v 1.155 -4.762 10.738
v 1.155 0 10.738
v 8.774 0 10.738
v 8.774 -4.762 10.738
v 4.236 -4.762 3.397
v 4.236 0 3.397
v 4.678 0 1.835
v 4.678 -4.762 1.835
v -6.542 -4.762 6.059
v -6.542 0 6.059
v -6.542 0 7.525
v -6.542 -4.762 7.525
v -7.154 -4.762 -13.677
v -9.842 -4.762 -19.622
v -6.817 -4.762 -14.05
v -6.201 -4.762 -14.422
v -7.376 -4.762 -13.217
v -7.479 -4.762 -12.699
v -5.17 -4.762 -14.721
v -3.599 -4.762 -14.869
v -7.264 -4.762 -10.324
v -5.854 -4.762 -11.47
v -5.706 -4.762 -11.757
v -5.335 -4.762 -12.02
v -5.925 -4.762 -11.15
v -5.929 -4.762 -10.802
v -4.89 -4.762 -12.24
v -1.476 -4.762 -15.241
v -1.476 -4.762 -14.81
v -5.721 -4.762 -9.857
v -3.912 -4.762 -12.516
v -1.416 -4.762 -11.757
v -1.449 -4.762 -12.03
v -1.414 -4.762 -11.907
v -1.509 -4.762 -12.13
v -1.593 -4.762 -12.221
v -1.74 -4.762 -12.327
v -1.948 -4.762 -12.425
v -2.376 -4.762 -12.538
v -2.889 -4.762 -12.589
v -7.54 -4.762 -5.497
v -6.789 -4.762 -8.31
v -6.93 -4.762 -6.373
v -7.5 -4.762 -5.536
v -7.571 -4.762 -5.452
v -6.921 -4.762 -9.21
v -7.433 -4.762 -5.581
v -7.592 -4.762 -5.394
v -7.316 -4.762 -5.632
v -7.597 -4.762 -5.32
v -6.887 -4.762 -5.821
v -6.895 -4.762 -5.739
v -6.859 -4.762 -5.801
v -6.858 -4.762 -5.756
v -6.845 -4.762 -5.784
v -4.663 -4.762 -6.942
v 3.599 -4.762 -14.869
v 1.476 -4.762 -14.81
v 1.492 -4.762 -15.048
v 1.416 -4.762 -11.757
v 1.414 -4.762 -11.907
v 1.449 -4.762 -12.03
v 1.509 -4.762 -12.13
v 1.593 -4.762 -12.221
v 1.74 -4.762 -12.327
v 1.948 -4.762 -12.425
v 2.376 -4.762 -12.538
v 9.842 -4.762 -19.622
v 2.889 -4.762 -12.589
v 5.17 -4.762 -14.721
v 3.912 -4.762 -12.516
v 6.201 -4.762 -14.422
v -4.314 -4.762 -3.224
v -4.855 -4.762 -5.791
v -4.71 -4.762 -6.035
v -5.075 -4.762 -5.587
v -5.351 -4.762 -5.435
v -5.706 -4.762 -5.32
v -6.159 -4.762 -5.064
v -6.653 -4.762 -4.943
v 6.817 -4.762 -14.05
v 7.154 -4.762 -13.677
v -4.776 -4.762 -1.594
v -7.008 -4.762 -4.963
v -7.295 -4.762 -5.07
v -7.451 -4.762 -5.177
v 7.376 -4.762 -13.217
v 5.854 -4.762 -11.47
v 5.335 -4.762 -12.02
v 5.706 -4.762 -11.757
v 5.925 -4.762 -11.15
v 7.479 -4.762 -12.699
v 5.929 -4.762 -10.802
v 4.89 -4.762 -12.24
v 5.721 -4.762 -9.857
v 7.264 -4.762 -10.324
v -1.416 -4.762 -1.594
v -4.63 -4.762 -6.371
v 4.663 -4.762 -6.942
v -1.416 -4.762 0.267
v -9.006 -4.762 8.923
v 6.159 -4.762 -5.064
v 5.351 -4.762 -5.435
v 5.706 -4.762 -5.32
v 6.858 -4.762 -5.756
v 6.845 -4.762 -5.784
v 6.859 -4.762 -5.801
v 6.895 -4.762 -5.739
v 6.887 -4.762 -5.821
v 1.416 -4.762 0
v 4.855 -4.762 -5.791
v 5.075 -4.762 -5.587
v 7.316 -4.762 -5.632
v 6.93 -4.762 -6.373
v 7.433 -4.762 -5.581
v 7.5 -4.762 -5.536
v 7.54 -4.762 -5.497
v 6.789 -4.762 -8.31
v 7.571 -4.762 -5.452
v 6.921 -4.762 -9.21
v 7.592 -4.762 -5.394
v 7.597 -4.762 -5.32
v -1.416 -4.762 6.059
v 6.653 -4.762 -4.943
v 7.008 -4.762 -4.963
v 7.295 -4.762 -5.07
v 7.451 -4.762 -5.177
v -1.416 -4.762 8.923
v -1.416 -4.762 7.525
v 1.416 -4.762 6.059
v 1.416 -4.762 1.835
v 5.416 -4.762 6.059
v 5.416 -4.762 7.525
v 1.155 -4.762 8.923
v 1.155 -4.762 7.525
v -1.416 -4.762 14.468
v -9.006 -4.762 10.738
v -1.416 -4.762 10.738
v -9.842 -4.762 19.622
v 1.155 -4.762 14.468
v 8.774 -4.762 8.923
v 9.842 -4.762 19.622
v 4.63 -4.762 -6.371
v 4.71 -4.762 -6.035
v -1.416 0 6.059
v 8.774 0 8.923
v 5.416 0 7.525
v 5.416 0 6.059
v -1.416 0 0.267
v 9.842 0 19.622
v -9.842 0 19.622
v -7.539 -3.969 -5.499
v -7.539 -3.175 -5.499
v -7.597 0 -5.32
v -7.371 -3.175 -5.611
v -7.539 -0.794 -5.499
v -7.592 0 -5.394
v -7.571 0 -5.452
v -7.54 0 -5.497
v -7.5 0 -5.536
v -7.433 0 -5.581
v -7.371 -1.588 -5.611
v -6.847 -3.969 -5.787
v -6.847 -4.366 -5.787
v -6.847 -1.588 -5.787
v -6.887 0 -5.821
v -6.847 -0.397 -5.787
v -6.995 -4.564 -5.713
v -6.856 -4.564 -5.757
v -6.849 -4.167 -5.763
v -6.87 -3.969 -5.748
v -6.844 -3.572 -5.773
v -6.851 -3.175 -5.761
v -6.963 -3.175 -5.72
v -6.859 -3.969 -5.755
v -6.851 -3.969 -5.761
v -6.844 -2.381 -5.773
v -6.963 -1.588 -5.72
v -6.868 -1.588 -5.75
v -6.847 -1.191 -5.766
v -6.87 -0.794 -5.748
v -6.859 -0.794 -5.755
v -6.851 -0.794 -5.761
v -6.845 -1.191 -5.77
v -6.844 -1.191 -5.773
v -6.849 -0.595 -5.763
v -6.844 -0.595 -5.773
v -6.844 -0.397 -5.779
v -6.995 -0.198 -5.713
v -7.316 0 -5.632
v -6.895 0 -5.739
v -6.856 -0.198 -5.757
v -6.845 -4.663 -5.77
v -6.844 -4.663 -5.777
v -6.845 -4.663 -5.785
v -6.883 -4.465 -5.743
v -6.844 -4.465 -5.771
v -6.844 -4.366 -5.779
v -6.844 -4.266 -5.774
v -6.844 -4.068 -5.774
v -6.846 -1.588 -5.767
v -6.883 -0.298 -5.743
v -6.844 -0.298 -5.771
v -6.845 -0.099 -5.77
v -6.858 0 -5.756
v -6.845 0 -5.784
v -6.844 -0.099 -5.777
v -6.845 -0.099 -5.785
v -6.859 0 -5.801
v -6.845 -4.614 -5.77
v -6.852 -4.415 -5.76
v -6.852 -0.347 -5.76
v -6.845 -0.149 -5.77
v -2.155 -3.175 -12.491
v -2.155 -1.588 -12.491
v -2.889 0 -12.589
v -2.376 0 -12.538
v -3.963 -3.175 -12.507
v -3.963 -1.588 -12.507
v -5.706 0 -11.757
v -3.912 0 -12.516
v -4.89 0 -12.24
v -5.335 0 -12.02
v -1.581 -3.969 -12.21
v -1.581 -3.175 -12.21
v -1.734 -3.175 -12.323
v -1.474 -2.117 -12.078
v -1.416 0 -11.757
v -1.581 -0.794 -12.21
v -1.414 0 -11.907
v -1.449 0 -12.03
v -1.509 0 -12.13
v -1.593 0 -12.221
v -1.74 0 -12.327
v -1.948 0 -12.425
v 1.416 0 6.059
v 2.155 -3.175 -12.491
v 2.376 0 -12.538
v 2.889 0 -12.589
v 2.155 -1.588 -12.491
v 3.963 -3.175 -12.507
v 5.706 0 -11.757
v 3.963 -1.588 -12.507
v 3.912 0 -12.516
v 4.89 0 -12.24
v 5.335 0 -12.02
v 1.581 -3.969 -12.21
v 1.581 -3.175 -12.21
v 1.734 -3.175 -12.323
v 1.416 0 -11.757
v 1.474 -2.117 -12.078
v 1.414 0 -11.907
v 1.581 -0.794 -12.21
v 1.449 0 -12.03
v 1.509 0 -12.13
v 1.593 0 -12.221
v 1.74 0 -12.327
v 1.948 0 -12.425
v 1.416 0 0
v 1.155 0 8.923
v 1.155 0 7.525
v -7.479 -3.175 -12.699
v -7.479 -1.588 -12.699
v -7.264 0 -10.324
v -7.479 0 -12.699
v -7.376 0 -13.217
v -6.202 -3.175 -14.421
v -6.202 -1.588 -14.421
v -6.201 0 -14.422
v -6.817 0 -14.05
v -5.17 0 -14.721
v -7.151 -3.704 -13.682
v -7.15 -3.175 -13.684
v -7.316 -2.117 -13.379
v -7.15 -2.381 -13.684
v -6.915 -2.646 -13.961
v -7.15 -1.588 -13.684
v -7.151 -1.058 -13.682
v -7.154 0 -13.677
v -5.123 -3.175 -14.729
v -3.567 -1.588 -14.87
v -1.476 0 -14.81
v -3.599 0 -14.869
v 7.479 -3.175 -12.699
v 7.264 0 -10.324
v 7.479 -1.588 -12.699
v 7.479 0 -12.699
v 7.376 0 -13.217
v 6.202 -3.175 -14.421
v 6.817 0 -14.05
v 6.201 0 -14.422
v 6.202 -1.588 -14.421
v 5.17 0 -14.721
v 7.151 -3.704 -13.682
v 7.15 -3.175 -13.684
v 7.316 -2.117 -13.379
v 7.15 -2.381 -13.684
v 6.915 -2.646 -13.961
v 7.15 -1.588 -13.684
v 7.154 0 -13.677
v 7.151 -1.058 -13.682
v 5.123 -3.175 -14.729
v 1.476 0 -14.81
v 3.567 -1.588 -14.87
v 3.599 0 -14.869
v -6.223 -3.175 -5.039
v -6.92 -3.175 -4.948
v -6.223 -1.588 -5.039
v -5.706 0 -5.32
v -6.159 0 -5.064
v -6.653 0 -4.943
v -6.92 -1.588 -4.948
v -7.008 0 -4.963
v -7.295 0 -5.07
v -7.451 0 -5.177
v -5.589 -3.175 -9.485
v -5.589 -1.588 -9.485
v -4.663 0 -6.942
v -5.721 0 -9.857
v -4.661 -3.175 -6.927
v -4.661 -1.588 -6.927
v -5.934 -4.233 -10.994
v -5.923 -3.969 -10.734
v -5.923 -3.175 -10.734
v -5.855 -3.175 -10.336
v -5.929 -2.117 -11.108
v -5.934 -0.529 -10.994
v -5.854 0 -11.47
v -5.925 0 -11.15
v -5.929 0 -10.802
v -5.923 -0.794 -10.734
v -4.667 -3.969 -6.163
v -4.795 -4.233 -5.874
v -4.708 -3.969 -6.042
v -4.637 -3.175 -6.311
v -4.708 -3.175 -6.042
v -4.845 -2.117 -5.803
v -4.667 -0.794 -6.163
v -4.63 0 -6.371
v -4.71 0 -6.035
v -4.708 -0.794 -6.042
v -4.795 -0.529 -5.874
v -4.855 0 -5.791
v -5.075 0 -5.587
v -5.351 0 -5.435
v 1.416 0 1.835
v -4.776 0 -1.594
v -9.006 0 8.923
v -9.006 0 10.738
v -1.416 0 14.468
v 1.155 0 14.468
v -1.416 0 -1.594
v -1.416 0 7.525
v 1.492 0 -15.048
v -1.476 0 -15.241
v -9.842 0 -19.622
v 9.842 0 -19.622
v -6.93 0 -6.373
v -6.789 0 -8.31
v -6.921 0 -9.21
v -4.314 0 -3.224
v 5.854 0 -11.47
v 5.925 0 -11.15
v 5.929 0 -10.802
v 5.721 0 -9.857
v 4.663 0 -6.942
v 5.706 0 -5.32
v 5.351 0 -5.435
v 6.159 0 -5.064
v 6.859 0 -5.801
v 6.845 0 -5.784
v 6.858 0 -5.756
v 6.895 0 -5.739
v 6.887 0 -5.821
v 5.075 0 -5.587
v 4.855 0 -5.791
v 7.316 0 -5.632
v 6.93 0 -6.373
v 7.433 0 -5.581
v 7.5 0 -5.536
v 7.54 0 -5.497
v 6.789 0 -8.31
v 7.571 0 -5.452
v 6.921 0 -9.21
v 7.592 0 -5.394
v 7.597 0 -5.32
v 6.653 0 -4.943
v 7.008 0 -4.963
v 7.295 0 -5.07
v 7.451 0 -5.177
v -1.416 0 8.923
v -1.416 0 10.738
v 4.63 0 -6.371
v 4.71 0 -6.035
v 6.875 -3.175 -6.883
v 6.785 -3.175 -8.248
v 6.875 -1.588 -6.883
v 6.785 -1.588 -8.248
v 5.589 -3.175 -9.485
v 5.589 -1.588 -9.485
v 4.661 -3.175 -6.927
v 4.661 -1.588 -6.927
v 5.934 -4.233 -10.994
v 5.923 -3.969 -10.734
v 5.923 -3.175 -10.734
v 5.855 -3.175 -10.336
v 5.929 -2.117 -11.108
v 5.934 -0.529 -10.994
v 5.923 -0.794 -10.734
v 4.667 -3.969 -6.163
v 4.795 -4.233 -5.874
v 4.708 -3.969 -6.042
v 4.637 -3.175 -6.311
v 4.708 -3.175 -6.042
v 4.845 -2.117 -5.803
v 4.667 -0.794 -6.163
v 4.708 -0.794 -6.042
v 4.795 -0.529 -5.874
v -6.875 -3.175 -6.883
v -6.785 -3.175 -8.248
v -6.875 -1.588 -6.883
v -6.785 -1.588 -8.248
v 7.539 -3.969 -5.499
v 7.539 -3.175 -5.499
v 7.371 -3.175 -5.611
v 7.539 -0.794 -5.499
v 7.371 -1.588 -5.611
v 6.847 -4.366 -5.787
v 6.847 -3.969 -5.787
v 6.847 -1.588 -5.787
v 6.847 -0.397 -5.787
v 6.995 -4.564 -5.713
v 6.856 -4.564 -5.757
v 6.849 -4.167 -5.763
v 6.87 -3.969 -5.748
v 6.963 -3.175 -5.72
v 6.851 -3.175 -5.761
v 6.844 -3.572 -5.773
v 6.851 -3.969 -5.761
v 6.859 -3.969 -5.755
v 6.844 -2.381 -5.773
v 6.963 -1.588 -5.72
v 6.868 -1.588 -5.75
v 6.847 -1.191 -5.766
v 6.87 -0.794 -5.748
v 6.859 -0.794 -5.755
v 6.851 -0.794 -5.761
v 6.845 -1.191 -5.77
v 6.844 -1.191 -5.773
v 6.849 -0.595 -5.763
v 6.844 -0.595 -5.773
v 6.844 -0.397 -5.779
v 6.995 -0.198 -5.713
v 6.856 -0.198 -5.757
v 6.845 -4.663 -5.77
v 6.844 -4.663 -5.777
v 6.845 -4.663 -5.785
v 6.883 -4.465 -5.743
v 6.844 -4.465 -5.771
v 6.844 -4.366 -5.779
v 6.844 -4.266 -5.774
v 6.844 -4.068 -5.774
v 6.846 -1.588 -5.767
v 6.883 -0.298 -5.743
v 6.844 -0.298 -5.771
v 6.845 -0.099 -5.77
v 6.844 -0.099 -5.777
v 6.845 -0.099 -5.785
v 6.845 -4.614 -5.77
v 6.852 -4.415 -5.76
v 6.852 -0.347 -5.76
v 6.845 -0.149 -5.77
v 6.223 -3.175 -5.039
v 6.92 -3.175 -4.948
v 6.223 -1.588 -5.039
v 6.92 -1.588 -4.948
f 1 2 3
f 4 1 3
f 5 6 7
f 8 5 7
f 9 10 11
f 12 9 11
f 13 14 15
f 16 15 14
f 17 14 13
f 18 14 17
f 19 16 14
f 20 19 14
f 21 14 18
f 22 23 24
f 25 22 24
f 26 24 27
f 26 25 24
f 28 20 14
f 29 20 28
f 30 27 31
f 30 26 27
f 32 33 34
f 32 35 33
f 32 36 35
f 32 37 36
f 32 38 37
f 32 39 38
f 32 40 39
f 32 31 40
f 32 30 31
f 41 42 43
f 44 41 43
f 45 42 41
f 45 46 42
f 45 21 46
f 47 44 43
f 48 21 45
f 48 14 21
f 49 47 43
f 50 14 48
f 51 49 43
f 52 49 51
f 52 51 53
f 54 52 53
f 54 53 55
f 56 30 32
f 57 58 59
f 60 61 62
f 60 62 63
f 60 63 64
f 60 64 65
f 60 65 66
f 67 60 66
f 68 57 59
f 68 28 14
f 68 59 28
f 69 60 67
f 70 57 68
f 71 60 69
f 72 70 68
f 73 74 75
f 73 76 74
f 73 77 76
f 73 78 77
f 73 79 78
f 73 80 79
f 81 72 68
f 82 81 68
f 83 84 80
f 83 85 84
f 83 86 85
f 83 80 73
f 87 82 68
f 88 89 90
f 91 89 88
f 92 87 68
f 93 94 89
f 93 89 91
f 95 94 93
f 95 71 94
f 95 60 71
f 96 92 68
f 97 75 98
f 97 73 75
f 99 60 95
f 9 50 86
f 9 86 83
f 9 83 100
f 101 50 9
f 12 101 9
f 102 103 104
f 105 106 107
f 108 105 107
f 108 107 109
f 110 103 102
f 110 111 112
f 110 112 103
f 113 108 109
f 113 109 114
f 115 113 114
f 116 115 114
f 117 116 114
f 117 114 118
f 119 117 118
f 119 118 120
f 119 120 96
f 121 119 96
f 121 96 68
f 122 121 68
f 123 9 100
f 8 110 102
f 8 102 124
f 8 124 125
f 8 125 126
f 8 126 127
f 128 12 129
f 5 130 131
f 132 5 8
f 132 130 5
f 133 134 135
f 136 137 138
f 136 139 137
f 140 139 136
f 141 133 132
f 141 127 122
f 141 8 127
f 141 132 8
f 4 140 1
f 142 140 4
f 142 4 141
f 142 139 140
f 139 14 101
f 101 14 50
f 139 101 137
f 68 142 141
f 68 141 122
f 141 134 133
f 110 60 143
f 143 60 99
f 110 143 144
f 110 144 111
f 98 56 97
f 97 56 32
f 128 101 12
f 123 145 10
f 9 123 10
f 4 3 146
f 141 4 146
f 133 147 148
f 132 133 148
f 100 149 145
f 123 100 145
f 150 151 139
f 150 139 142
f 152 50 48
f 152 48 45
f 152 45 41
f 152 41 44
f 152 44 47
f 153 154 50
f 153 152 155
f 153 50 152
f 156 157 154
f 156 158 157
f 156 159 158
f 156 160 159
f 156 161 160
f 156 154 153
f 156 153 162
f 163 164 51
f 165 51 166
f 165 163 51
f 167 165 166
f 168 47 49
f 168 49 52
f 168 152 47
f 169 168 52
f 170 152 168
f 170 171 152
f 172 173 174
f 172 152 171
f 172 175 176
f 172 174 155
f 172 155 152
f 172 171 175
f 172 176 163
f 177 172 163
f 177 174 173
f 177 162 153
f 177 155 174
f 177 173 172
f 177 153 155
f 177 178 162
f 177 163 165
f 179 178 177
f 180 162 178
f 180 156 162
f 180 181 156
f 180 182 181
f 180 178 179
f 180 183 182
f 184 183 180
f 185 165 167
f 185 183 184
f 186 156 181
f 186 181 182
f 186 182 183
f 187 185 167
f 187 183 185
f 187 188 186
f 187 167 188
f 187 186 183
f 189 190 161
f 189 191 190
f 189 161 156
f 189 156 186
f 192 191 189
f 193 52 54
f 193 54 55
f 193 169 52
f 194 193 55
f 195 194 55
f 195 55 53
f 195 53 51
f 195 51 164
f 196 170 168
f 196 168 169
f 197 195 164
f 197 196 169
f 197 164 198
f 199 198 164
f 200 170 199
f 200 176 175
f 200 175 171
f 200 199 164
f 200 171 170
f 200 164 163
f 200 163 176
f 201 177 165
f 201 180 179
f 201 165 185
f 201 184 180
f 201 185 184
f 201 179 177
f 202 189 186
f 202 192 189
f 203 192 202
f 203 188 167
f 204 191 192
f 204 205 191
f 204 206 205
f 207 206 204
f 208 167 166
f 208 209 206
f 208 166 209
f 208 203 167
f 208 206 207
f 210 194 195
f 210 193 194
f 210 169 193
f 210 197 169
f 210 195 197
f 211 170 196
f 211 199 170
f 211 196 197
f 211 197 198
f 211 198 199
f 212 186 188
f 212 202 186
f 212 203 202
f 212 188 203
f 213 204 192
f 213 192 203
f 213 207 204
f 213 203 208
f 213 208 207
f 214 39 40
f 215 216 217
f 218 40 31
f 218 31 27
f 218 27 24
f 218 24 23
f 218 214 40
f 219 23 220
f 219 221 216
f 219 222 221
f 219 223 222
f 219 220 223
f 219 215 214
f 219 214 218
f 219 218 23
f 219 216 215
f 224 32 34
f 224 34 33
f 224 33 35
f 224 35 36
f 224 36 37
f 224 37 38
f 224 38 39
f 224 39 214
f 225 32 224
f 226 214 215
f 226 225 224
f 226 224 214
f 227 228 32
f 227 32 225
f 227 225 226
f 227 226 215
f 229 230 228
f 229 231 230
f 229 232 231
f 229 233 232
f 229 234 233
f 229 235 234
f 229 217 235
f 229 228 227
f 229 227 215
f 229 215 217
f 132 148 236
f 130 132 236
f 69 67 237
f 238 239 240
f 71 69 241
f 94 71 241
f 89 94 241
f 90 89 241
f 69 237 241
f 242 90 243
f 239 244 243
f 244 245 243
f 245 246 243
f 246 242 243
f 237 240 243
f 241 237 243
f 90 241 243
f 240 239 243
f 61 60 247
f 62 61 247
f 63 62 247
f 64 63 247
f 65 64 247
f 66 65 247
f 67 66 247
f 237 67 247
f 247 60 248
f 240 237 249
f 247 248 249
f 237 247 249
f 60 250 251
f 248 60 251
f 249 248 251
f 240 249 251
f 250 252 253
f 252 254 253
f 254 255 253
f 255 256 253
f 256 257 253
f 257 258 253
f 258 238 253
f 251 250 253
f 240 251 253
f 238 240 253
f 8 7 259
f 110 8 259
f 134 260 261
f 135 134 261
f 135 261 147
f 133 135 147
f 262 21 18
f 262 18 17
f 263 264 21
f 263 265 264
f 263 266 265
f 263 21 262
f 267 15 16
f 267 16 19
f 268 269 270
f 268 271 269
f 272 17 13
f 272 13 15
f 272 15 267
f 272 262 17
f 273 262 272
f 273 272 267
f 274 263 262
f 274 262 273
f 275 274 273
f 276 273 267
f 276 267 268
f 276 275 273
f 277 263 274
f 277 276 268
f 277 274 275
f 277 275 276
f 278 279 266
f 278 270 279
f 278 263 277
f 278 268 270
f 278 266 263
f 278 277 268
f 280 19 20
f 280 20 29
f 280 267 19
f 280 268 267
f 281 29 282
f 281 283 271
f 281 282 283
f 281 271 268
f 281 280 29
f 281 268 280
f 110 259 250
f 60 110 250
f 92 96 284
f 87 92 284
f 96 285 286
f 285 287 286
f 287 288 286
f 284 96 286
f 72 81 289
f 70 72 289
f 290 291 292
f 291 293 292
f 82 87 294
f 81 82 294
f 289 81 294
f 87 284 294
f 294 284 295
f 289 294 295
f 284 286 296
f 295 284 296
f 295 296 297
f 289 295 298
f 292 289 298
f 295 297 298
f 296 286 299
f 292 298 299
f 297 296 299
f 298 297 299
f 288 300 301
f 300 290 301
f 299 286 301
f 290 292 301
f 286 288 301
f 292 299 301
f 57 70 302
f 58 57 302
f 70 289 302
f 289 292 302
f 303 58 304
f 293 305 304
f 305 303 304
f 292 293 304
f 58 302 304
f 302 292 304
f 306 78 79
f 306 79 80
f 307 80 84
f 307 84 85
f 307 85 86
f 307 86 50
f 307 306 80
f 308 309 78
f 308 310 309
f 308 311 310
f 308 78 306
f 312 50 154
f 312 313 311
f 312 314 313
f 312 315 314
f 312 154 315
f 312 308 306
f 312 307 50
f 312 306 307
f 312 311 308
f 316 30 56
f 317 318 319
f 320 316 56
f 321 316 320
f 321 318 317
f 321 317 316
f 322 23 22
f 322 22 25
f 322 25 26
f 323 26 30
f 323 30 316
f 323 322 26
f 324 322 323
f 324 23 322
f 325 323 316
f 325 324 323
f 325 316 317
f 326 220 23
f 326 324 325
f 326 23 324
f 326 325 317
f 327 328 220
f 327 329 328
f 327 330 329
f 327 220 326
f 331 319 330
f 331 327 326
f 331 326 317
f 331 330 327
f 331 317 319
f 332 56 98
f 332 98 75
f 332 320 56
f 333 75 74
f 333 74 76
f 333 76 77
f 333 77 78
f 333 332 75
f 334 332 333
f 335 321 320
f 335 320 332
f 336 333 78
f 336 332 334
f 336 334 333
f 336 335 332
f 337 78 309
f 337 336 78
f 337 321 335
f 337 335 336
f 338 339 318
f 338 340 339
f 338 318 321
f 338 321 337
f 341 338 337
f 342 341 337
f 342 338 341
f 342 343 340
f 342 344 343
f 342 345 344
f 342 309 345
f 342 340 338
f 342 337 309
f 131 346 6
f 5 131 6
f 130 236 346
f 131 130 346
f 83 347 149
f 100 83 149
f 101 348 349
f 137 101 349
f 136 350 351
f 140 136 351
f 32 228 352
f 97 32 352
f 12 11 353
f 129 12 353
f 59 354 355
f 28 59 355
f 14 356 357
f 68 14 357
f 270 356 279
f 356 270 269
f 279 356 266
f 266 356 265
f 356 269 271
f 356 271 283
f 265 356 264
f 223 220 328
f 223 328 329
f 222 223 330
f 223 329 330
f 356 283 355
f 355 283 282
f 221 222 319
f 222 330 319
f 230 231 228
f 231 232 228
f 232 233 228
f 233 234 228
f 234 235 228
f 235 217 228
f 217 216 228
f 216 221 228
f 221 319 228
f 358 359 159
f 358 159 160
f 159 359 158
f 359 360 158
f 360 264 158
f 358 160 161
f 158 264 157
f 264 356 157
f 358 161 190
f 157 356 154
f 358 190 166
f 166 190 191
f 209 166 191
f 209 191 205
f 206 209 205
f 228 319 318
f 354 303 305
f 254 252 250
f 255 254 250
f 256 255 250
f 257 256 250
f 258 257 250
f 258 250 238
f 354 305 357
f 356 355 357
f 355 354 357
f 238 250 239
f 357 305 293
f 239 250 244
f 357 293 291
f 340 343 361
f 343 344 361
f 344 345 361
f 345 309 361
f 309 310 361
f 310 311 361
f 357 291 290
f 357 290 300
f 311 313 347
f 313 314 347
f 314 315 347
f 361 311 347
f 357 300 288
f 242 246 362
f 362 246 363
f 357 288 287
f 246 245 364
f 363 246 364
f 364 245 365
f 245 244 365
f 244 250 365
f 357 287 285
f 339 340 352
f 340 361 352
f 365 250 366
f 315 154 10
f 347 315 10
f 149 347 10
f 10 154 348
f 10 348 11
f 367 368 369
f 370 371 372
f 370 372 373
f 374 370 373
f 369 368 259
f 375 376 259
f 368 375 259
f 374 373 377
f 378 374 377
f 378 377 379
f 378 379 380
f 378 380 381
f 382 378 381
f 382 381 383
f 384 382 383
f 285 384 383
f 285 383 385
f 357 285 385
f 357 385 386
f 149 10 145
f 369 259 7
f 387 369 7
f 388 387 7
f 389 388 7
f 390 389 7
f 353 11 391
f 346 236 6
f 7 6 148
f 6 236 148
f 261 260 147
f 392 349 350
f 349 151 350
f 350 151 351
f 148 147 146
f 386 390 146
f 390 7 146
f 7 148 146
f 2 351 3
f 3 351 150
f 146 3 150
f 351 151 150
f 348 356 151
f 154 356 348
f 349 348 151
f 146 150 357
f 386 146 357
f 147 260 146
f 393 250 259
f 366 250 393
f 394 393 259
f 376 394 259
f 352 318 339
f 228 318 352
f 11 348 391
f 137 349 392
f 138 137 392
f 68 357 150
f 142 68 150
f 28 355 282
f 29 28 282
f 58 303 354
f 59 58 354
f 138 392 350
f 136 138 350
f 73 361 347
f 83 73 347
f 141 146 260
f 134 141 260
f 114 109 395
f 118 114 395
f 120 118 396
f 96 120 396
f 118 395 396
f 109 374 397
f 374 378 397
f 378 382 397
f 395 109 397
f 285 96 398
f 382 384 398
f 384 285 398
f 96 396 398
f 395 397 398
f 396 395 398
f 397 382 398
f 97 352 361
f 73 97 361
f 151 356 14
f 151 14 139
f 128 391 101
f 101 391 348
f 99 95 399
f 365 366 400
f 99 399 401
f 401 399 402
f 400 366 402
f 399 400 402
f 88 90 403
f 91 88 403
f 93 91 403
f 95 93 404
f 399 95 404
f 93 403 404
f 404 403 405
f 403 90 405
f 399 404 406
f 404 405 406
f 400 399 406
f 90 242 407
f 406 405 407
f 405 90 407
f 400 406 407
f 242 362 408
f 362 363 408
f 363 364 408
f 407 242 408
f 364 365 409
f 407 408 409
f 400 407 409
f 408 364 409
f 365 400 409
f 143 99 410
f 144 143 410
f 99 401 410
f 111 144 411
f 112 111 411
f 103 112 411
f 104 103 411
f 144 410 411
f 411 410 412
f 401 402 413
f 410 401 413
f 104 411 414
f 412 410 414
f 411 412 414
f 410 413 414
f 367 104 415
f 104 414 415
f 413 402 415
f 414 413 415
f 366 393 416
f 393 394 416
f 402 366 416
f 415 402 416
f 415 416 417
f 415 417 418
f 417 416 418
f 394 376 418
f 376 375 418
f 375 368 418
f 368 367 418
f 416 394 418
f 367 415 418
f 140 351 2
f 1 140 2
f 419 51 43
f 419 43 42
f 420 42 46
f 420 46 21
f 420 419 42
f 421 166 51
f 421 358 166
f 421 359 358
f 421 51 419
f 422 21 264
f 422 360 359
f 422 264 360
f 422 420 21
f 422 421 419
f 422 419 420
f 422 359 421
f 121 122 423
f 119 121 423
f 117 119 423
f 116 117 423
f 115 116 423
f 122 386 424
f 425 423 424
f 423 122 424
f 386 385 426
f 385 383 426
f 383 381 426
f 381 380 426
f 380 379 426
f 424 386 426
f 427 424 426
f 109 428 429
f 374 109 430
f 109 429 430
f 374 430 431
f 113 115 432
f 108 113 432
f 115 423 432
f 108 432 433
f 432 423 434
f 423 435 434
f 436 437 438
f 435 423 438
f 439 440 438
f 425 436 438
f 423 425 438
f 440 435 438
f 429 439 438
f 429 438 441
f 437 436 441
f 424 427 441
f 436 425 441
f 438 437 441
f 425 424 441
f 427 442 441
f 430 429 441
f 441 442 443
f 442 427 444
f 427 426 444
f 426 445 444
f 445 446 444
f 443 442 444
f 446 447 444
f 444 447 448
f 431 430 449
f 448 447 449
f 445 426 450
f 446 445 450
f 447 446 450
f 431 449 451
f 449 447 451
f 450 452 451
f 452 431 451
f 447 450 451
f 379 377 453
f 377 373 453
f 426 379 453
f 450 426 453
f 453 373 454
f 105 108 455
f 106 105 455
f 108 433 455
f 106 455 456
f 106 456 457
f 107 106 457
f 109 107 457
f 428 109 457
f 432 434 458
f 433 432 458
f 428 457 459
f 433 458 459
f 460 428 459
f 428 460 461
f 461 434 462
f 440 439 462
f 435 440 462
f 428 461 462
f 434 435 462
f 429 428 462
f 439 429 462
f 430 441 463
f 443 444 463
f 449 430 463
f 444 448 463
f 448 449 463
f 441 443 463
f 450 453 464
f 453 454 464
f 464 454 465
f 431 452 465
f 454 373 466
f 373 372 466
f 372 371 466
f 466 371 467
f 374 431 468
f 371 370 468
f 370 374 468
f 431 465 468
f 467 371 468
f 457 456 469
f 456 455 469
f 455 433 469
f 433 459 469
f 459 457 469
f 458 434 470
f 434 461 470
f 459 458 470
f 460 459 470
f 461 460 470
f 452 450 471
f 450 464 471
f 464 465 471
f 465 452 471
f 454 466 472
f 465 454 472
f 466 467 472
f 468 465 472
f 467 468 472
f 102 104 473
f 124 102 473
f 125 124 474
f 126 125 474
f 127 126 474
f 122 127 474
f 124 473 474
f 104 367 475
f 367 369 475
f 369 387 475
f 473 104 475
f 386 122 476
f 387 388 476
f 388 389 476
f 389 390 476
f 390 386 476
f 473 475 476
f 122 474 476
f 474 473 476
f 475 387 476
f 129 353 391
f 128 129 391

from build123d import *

# Parameters (mm, degrees)
F0_W     = 19.685
F0_H     = 39.243
F1_DEPTH = 4.7625


with BuildPart() as f1:
    # F0 (on Front) → F1 (new body)
    with BuildSketch(Plane.XZ):
        Rectangle(F0_W, F0_H)
        with BuildLine():
            Line((-1.416165, 10.738444), (-1.416165, 14.467826))
            Line((-1.416165, 14.467826), (1.154919, 14.467826))
            Line((1.154919, 14.467826), (1.154919, 10.738444))
            Line((1.154919, 10.738444), (8.774072, 10.738444))
            Line((8.774072, 10.738444), (8.774072, 8.923113))
            Line((8.774072, 8.923113), (1.154919, 8.923113))
            Line((1.154919, 8.923113), (1.154919, 7.524595))
            Line((1.154919, 7.524595), (5.415907, 7.524595))
            Line((5.415907, 7.524595), (5.415907, 6.059481))
            Line((5.415907, 6.059481), (1.416165, 6.059481))
            Line((1.416165, 6.059481), (1.416165, 1.835253))
            Line((1.416165, 1.835253), (4.235704, 3.396667))
            Line((4.235704, 3.396667), (4.677869, 1.835253))
            Line((4.677869, 1.835253), (1.416165, 0))
            Line((1.416165, 0), (1.416165, -11.756658))
            add(Edge.make_bspline(
                [(1.416165, -11.756658), (1.242965, -12.833442), (4.373882, -12.906026), (5.705804, -11.756658)],
                knots=[0, 0, 0, 0, 4.28964, 4.28964, 4.28964, 4.28964], degree=3))
            add(Edge.make_bspline(
                [(5.705804, -11.756658), (6.922635, -10.041888), (2.745998, -6.038307), (5.705804, -5.319911)],
                knots=[0, 0, 0, 0, 6.436747, 6.436747, 6.436747, 6.436747], degree=3))
            add(Edge.make_bspline(
                [(5.705804, -5.319911), (6.064445, -5.036285), (6.99884, -4.625151), (7.596853, -5.319911)],
                knots=[0, 0, 0, 0, 1.891049, 1.891049, 1.891049, 1.891049], degree=3))
            add(Edge.make_bspline(
                [(7.596853, -5.319911), (7.633185, -5.759441), (6.625983, -5.666271), (6.886712, -5.821177)],
                knots=[0, 0, 0, 0, 0.869234, 0.869234, 0.869234, 0.869234], degree=3))
            add(Edge.make_bspline(
                [(6.886712, -5.821177), (7.130291, -6.867712), (6.284833, -7.757668), (7.263785, -10.323707)],
                knots=[0, 0, 0, 0, 4.518291, 4.518291, 4.518291, 4.518291], degree=3))
            add(Edge.make_bspline(
                [(7.263785, -10.323707), (7.573401, -12.799004), (8.579135, -15.313338), (1.476139, -14.810471)],
                knots=[0, 0, 0, 0, 7.323106, 7.323106, 7.323106, 7.323106], degree=3))
            Line((1.476139, -14.810471), (1.491606, -15.047969))
            Line((1.491606, -15.047969), (-1.476139, -15.241242))
            Line((-1.476139, -15.241242), (-1.476139, -14.810471))
            add(Edge.make_bspline(
                [(-7.263785, -10.323707), (-7.573401, -12.799004), (-8.579135, -15.313338), (-1.476139, -14.810471)],
                knots=[0, 0, 0, 0, 7.323106, 7.323106, 7.323106, 7.323106], degree=3))
            add(Edge.make_bspline(
                [(-6.886712, -5.821177), (-7.130291, -6.867712), (-6.284833, -7.757668), (-7.263785, -10.323707)],
                knots=[0, 0, 0, 0, 4.518291, 4.518291, 4.518291, 4.518291], degree=3))
            add(Edge.make_bspline(
                [(-7.596853, -5.319911), (-7.633185, -5.759441), (-6.625983, -5.666271), (-6.886712, -5.821177)],
                knots=[0, 0, 0, 0, 0.869234, 0.869234, 0.869234, 0.869234], degree=3))
            add(Edge.make_bspline(
                [(-5.705804, -5.319911), (-6.064445, -5.036285), (-6.99884, -4.625151), (-7.596853, -5.319911)],
                knots=[0, 0, 0, 0, 1.891049, 1.891049, 1.891049, 1.891049], degree=3))
            add(Edge.make_bspline(
                [(-5.705804, -11.756658), (-6.922635, -10.041888), (-2.745998, -6.038307), (-5.705804, -5.319911)],
                knots=[0, 0, 0, 0, 6.436747, 6.436747, 6.436747, 6.436747], degree=3))
            add(Edge.make_bspline(
                [(-1.416165, -11.756658), (-1.242965, -12.833442), (-4.373882, -12.906026), (-5.705804, -11.756658)],
                knots=[0, 0, 0, 0, 4.28964, 4.28964, 4.28964, 4.28964], degree=3))
            Line((-1.416165, -11.756658), (-1.416165, -1.593658))
            Line((-1.416165, -1.593658), (-4.31391, -3.224124))
            Line((-4.31391, -3.224124), (-4.775628, -1.593658))
            Line((-4.775628, -1.593658), (-1.416165, 0.266757))
            Line((-1.416165, 0.266757), (-1.416165, 6.059481))
            Line((-1.416165, 6.059481), (-6.541871, 6.059481))
            Line((-6.541871, 6.059481), (-6.541871, 7.524595))
            Line((-6.541871, 7.524595), (-1.416165, 7.524595))
            Line((-1.416165, 7.524595), (-1.416165, 8.923113))
            Line((-1.416165, 8.923113), (-9.005928, 8.923113))
            Line((-9.005928, 8.923113), (-9.005928, 10.738444))
            Line((-9.005928, 10.738444), (-1.416165, 10.738444))
        make_face(mode=Mode.SUBTRACT)
    extrude(amount=F1_DEPTH)


solid = f1.part
